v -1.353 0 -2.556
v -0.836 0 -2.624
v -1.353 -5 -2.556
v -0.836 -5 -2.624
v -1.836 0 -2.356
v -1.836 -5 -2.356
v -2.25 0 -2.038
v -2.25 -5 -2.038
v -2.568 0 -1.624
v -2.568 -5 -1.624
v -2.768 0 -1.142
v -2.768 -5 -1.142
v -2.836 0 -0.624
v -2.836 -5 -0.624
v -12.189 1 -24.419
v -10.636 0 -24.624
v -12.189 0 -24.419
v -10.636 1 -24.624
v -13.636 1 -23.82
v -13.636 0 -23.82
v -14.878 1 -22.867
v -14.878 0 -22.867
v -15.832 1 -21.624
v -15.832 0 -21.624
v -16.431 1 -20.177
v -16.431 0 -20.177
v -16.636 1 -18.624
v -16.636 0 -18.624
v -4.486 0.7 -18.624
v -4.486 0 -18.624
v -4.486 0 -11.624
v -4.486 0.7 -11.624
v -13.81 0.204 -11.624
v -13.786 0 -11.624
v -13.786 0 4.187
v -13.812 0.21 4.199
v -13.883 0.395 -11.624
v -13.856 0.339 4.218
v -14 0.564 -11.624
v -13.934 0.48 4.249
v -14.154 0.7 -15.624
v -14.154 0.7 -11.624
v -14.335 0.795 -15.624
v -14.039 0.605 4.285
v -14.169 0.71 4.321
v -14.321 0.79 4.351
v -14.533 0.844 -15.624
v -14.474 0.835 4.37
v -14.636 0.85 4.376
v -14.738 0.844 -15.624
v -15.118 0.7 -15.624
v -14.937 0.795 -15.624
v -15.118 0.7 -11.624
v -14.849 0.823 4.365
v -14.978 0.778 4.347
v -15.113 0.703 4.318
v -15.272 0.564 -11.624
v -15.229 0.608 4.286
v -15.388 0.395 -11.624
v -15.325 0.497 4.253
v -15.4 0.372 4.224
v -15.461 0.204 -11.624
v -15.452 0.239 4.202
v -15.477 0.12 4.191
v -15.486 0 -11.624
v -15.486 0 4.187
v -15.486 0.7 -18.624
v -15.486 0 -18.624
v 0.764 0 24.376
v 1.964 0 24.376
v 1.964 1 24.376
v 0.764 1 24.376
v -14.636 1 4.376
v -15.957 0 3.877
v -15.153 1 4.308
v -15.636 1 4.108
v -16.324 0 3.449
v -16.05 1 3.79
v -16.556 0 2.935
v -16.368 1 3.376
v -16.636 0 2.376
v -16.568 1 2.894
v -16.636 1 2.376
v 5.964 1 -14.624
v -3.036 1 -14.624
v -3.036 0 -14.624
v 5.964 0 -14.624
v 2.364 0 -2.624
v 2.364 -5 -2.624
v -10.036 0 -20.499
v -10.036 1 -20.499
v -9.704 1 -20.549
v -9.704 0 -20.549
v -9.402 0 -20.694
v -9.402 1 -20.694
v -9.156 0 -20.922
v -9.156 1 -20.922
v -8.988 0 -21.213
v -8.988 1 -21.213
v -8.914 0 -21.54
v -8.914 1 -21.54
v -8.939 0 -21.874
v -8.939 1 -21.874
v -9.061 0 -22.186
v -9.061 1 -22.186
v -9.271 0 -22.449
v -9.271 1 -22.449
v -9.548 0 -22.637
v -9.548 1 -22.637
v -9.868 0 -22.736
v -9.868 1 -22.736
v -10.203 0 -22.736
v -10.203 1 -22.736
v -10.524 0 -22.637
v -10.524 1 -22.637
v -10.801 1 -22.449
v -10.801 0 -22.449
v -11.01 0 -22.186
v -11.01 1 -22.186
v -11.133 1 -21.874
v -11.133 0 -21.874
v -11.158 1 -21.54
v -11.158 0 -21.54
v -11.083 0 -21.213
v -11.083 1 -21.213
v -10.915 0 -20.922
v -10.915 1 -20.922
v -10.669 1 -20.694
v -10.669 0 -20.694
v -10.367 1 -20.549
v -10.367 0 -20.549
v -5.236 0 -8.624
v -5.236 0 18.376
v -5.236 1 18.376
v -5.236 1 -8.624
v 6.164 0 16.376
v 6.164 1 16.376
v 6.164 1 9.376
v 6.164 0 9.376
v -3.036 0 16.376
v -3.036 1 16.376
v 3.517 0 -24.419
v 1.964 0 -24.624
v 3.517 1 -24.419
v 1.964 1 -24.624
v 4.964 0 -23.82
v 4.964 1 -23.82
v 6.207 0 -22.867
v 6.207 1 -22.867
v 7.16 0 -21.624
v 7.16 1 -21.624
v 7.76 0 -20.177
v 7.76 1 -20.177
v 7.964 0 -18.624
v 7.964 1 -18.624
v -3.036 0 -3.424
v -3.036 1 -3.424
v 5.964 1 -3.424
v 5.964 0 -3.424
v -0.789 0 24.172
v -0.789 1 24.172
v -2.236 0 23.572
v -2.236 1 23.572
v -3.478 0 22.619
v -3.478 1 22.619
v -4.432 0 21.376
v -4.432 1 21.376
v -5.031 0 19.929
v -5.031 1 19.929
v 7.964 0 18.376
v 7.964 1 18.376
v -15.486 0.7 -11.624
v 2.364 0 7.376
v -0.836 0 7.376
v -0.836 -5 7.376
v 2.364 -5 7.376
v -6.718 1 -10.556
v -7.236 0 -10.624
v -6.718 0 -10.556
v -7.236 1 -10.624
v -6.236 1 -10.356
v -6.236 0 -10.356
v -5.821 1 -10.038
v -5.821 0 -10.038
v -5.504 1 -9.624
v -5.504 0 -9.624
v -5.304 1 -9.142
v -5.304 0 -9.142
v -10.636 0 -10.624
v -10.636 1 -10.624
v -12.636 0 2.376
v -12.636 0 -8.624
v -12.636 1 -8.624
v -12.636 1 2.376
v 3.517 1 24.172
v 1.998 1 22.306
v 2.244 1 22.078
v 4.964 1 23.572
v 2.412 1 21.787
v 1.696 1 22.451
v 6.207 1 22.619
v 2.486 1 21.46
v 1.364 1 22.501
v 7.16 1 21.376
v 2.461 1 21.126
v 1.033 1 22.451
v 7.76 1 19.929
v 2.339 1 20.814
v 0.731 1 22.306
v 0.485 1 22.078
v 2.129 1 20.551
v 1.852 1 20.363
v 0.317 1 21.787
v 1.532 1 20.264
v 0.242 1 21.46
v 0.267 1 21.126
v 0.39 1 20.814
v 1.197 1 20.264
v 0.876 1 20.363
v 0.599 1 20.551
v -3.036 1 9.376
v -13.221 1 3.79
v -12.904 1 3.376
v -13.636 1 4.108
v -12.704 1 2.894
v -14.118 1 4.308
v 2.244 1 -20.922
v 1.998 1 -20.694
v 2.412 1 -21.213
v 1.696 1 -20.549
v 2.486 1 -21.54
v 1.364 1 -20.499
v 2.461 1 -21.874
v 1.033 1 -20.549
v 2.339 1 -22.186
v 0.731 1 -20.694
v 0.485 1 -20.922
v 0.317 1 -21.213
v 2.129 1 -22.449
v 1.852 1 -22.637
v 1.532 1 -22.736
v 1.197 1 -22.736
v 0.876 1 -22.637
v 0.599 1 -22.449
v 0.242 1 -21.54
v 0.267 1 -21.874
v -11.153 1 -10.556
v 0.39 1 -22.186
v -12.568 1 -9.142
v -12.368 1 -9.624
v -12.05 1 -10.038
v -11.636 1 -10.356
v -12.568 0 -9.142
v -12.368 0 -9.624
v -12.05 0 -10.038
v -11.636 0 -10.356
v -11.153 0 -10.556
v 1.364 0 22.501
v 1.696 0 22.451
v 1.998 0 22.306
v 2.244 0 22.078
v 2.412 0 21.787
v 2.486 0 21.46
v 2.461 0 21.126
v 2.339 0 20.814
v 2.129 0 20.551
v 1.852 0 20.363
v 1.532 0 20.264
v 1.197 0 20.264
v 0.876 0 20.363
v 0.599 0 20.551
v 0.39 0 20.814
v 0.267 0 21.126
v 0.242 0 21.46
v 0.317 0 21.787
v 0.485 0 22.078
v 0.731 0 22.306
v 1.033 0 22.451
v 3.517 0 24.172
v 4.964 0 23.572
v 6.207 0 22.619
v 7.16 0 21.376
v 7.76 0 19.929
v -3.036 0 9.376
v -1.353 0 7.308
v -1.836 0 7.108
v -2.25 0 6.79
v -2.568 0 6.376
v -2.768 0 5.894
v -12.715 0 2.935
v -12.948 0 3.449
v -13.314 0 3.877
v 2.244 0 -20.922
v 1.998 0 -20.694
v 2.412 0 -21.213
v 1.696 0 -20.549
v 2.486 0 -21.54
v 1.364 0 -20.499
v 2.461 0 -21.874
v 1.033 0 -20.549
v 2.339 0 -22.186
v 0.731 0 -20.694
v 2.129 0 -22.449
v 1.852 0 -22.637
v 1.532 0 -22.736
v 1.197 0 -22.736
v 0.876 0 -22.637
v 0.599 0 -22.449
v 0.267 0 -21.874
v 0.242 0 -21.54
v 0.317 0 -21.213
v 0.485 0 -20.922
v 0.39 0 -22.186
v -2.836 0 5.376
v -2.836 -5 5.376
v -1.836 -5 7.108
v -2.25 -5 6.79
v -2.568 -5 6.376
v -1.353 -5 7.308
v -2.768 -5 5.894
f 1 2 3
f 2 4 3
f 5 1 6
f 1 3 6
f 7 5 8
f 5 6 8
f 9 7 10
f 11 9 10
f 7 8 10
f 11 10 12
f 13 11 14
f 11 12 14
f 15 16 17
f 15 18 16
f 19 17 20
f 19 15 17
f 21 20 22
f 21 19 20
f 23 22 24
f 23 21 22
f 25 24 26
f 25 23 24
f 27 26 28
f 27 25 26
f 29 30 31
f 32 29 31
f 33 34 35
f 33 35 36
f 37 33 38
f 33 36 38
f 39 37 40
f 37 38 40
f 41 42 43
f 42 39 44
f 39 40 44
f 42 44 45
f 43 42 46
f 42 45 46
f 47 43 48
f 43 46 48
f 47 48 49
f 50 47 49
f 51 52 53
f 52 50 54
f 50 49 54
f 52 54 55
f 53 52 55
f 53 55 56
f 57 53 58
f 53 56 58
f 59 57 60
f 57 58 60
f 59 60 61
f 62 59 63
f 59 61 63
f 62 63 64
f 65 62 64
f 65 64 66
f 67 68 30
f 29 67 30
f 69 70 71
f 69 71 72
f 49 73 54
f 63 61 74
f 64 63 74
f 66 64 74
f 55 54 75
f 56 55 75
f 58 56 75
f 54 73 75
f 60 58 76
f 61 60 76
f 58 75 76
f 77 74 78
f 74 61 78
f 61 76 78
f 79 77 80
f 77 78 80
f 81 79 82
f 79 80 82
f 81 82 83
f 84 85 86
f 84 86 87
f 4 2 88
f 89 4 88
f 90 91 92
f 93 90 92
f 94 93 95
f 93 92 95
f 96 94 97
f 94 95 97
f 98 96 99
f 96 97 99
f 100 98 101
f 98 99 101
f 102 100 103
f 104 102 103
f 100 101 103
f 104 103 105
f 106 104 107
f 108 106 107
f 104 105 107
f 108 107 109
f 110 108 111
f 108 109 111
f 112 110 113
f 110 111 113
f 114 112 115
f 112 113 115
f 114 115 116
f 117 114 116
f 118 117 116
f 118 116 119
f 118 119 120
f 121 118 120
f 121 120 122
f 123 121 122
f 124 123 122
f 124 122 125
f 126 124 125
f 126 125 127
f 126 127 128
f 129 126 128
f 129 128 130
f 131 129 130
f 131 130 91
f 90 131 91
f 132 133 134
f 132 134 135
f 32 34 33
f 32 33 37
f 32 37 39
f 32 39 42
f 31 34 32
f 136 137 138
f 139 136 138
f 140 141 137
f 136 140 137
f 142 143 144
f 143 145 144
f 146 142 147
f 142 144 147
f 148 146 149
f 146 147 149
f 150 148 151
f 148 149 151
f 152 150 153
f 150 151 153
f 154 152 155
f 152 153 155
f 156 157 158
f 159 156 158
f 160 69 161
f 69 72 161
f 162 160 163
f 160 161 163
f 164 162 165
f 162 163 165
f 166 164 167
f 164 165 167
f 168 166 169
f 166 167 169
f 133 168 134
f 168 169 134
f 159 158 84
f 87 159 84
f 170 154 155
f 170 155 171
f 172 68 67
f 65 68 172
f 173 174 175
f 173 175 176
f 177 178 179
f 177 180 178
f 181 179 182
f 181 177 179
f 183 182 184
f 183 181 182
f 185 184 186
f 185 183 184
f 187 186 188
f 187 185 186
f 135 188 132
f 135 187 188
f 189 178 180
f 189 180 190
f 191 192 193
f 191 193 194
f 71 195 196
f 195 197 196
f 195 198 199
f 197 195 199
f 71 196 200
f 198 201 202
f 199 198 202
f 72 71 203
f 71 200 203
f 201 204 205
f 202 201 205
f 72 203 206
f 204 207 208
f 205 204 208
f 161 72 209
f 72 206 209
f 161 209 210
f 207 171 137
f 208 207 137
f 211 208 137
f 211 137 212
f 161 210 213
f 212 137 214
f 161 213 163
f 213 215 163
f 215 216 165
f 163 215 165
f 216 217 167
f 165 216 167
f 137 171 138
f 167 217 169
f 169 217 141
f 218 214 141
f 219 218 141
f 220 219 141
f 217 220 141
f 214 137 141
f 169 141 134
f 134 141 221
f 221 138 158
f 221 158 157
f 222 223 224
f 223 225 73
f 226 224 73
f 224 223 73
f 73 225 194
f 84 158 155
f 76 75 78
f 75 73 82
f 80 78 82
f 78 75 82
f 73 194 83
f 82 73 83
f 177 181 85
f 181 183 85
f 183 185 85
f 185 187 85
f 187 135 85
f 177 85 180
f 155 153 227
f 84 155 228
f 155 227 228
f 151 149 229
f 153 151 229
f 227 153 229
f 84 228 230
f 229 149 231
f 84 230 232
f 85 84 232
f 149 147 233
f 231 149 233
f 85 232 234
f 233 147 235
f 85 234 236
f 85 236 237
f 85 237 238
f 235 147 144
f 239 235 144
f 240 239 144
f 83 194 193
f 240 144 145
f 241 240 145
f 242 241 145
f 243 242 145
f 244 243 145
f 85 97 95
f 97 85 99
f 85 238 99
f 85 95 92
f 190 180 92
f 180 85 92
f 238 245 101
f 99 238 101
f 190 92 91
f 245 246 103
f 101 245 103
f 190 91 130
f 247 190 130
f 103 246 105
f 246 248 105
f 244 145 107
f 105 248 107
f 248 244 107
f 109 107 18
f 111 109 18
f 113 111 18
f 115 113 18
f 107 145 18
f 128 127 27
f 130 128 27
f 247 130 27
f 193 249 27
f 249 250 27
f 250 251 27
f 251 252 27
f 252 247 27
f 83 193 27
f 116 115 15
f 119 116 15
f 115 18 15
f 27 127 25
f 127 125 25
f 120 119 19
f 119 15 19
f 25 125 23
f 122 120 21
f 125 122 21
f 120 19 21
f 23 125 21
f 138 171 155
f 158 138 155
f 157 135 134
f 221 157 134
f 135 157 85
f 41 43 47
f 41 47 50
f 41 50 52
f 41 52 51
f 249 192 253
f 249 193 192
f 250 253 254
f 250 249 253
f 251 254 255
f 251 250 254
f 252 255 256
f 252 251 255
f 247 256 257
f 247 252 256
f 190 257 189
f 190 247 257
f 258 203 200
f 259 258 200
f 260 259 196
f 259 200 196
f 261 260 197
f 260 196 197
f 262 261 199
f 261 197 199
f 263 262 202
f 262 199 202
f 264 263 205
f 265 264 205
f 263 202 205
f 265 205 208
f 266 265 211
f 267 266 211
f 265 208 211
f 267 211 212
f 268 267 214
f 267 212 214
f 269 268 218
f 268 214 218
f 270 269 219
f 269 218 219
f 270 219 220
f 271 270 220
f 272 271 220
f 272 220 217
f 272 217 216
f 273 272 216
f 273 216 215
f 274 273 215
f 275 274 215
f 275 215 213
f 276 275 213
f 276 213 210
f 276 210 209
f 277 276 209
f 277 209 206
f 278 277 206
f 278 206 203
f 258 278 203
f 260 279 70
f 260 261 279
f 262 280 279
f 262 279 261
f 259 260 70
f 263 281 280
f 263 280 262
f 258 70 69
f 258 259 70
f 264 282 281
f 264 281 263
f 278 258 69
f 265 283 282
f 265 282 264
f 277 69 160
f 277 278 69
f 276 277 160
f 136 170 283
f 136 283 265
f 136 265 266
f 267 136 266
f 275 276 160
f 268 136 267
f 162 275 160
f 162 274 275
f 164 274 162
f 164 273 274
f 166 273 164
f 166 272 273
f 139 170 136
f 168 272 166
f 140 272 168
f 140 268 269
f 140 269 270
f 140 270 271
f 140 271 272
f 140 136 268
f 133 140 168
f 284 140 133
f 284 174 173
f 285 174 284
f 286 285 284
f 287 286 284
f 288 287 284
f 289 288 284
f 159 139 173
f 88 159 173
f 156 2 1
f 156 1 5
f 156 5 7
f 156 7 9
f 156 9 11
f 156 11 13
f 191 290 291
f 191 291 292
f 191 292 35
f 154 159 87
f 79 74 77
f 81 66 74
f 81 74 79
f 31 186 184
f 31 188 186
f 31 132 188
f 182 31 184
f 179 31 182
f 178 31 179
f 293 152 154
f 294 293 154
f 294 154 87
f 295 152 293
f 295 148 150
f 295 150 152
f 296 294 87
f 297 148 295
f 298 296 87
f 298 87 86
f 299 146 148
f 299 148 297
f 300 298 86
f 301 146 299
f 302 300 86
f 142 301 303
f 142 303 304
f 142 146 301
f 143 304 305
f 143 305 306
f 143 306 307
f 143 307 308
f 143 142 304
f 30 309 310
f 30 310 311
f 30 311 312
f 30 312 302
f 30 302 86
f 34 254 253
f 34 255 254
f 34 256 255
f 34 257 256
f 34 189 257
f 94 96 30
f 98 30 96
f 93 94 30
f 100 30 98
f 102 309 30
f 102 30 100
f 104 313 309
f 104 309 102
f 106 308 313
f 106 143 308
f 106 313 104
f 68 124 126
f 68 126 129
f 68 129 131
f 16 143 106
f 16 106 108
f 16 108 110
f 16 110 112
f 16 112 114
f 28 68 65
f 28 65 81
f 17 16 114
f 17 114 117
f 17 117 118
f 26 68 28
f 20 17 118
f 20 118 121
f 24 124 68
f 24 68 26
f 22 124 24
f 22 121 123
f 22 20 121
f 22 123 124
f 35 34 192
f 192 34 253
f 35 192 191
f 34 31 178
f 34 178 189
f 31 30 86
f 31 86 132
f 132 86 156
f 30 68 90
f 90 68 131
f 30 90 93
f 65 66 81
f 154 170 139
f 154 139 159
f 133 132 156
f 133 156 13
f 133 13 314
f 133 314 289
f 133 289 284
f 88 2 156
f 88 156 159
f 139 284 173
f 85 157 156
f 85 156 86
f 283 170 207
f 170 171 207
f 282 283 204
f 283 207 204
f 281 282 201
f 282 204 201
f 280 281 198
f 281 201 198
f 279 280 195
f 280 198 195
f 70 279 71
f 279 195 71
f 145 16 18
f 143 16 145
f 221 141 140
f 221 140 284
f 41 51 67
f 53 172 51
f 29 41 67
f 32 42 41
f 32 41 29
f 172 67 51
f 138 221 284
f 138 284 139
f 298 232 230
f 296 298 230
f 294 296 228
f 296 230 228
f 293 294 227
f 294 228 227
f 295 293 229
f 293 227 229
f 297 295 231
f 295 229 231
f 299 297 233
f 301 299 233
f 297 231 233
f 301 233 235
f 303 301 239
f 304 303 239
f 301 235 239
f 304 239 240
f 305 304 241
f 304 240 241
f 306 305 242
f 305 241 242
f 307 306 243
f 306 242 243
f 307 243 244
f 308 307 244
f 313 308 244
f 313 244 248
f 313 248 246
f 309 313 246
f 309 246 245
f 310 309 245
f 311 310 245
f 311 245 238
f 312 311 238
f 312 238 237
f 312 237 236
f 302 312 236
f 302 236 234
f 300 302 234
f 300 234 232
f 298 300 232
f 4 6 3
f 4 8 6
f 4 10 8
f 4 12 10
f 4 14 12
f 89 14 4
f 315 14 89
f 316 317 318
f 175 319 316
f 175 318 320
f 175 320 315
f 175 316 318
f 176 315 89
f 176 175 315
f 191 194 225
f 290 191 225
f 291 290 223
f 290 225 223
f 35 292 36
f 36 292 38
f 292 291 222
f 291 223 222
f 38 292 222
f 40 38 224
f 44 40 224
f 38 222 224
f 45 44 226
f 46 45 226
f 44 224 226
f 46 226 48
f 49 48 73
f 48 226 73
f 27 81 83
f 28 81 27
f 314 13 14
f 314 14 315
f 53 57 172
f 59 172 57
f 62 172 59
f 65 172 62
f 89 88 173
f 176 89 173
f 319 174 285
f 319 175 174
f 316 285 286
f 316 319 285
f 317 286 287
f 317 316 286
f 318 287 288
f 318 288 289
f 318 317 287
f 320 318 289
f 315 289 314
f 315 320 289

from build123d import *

# Parameters (mm, degrees)
BOSS_EXTRUDE1_DEPTH = 1
SKETCH4_R           = 1.125
CUT_EXTRUDE3_DEPTH  = 6
FILLET1_R           = 6
FILLET2_R           = 2
SKETCH3_R           = 0.85
CUT_EXTRUDE5_DEPTH  = 20
SKETCH6_W           = 11
SKETCH6_H           = 7
CUT_EXTRUDE6_DEPTH  = 0.7
SKETCH7_W           = 9.2
SKETCH7_H           = 7
SKETCH7_W_2         = 9
SKETCH7_H_2         = 11.2
CUT_EXTRUDE7_DEPTH  = 30.733515978
SKETCH8_W           = 5.2
SKETCH8_H           = 10
BOSS_EXTRUDE2_DEPTH = 5
FILLET4_R           = 2


with BuildPart() as part:
    # Sketch1 → Boss-Extrude1 (new body)
    with BuildSketch(Plane(origin=(0, 0, 0), x_dir=(1, 0, 0), z_dir=(0, 1, 0))):
        Polygon((-16.635707691, 24.623874564), (7.964292309, 24.623874564), (7.964292309, -24.376125436), (-5.235707691, -24.376125436), (-5.235707691, 10.623874564), (-12.635707691, 10.623874564), (-12.635707691, -4.376125436), (-16.635707691, -4.376125436), align=None)
    extrude(amount=BOSS_EXTRUDE1_DEPTH)

    # Sketch4 → Cut-Extrude3 (cut)
    with BuildSketch(Plane(origin=(0, 1, 0), x_dir=(1, 0, 0), z_dir=(0, 1, 0))):
        with Locations(Location((-10.035707691, 21.623874564, 0), (0, 0, 270))):
            Circle(SKETCH4_R)
        with Locations(Location((1.364292309, 21.623874564, 0), (0, 0, 270))):
            Circle(SKETCH4_R)
        with Locations(Location((1.364292309, -21.376125436, 0), (0, 0, 270))):
            Circle(SKETCH4_R)
    extrude(amount=-CUT_EXTRUDE3_DEPTH, mode=Mode.SUBTRACT)

    # Fillet1
    fillet1_edges = [part.edges().sort_by_distance(p)[0] for p in [
        (-16.635707691, 0.5, -24.623874564),
        (7.964292309, 0.5, -24.623874564),
        (7.964292309, 0.5, 24.376125436),
        (-5.235707691, 0.5, 24.376125436),
    ]]
    fillet(fillet1_edges, radius=FILLET1_R)

    # Fillet2
    fillet2_edges = [part.edges().sort_by_distance(p)[0] for p in [
        (-5.235707691, 0.5, -10.623874564),
        (-12.635707691, 0.5, -10.623874564),
    ]]
    fillet(fillet2_edges, radius=FILLET2_R)
    fillet2_2_edges = [part.edges().sort_by_distance(p)[0] for p in [
        (-12.635707691, 0.5, 4.376125436),
        (-16.635707691, 0.5, 4.376125436),
    ]]
    fillet(fillet2_2_edges, radius=FILLET2_R - 0.0001)  # a hair under: the kernel refuses the full size

    # Sketch3 → Cut-Extrude5 (cut)
    with BuildSketch(Plane.XY.offset(4.376125436)):
        with Locations((-14.635707691, 0)):
            Circle(SKETCH3_R)
    extrude(amount=-CUT_EXTRUDE5_DEPTH, mode=Mode.SUBTRACT)

    # Sketch6 → Cut-Extrude6 (cut)
    with BuildSketch(Plane.XZ):
        with Locations((-9.985707691, -15.123874564)):
            Rectangle(SKETCH6_W, SKETCH6_H)
    extrude(amount=-CUT_EXTRUDE6_DEPTH, mode=Mode.SUBTRACT)

    # Sketch7 → Cut-Extrude7 (cut, through all)
    with BuildSketch(Plane(origin=(0, 1, 0), x_dir=(1, 0, 0), z_dir=(0, 1, 0))):
        with Locations((1.564292309, -12.876125436)):
            Rectangle(SKETCH7_W, SKETCH7_H)
        with Locations((1.464292309, 9.023874564)):
            Rectangle(SKETCH7_W_2, SKETCH7_H_2)
    extrude(amount=-CUT_EXTRUDE7_DEPTH, mode=Mode.SUBTRACT)

    # Sketch8 → Boss-Extrude2 (add)
    with BuildSketch(Plane.XZ):
        with Locations((-0.235707691, 2.376125436)):
            Rectangle(SKETCH8_W, SKETCH8_H)
    extrude(amount=BOSS_EXTRUDE2_DEPTH)

    # Fillet4
    fillet4_edges = [part.edges().sort_by_distance(p)[0] for p in [
        (-2.835707691, -2.5, 7.376125436),
        (-2.835707691, -2.5, -2.623874564),
    ]]
    fillet(fillet4_edges, radius=FILLET4_R)


solid = part.part
